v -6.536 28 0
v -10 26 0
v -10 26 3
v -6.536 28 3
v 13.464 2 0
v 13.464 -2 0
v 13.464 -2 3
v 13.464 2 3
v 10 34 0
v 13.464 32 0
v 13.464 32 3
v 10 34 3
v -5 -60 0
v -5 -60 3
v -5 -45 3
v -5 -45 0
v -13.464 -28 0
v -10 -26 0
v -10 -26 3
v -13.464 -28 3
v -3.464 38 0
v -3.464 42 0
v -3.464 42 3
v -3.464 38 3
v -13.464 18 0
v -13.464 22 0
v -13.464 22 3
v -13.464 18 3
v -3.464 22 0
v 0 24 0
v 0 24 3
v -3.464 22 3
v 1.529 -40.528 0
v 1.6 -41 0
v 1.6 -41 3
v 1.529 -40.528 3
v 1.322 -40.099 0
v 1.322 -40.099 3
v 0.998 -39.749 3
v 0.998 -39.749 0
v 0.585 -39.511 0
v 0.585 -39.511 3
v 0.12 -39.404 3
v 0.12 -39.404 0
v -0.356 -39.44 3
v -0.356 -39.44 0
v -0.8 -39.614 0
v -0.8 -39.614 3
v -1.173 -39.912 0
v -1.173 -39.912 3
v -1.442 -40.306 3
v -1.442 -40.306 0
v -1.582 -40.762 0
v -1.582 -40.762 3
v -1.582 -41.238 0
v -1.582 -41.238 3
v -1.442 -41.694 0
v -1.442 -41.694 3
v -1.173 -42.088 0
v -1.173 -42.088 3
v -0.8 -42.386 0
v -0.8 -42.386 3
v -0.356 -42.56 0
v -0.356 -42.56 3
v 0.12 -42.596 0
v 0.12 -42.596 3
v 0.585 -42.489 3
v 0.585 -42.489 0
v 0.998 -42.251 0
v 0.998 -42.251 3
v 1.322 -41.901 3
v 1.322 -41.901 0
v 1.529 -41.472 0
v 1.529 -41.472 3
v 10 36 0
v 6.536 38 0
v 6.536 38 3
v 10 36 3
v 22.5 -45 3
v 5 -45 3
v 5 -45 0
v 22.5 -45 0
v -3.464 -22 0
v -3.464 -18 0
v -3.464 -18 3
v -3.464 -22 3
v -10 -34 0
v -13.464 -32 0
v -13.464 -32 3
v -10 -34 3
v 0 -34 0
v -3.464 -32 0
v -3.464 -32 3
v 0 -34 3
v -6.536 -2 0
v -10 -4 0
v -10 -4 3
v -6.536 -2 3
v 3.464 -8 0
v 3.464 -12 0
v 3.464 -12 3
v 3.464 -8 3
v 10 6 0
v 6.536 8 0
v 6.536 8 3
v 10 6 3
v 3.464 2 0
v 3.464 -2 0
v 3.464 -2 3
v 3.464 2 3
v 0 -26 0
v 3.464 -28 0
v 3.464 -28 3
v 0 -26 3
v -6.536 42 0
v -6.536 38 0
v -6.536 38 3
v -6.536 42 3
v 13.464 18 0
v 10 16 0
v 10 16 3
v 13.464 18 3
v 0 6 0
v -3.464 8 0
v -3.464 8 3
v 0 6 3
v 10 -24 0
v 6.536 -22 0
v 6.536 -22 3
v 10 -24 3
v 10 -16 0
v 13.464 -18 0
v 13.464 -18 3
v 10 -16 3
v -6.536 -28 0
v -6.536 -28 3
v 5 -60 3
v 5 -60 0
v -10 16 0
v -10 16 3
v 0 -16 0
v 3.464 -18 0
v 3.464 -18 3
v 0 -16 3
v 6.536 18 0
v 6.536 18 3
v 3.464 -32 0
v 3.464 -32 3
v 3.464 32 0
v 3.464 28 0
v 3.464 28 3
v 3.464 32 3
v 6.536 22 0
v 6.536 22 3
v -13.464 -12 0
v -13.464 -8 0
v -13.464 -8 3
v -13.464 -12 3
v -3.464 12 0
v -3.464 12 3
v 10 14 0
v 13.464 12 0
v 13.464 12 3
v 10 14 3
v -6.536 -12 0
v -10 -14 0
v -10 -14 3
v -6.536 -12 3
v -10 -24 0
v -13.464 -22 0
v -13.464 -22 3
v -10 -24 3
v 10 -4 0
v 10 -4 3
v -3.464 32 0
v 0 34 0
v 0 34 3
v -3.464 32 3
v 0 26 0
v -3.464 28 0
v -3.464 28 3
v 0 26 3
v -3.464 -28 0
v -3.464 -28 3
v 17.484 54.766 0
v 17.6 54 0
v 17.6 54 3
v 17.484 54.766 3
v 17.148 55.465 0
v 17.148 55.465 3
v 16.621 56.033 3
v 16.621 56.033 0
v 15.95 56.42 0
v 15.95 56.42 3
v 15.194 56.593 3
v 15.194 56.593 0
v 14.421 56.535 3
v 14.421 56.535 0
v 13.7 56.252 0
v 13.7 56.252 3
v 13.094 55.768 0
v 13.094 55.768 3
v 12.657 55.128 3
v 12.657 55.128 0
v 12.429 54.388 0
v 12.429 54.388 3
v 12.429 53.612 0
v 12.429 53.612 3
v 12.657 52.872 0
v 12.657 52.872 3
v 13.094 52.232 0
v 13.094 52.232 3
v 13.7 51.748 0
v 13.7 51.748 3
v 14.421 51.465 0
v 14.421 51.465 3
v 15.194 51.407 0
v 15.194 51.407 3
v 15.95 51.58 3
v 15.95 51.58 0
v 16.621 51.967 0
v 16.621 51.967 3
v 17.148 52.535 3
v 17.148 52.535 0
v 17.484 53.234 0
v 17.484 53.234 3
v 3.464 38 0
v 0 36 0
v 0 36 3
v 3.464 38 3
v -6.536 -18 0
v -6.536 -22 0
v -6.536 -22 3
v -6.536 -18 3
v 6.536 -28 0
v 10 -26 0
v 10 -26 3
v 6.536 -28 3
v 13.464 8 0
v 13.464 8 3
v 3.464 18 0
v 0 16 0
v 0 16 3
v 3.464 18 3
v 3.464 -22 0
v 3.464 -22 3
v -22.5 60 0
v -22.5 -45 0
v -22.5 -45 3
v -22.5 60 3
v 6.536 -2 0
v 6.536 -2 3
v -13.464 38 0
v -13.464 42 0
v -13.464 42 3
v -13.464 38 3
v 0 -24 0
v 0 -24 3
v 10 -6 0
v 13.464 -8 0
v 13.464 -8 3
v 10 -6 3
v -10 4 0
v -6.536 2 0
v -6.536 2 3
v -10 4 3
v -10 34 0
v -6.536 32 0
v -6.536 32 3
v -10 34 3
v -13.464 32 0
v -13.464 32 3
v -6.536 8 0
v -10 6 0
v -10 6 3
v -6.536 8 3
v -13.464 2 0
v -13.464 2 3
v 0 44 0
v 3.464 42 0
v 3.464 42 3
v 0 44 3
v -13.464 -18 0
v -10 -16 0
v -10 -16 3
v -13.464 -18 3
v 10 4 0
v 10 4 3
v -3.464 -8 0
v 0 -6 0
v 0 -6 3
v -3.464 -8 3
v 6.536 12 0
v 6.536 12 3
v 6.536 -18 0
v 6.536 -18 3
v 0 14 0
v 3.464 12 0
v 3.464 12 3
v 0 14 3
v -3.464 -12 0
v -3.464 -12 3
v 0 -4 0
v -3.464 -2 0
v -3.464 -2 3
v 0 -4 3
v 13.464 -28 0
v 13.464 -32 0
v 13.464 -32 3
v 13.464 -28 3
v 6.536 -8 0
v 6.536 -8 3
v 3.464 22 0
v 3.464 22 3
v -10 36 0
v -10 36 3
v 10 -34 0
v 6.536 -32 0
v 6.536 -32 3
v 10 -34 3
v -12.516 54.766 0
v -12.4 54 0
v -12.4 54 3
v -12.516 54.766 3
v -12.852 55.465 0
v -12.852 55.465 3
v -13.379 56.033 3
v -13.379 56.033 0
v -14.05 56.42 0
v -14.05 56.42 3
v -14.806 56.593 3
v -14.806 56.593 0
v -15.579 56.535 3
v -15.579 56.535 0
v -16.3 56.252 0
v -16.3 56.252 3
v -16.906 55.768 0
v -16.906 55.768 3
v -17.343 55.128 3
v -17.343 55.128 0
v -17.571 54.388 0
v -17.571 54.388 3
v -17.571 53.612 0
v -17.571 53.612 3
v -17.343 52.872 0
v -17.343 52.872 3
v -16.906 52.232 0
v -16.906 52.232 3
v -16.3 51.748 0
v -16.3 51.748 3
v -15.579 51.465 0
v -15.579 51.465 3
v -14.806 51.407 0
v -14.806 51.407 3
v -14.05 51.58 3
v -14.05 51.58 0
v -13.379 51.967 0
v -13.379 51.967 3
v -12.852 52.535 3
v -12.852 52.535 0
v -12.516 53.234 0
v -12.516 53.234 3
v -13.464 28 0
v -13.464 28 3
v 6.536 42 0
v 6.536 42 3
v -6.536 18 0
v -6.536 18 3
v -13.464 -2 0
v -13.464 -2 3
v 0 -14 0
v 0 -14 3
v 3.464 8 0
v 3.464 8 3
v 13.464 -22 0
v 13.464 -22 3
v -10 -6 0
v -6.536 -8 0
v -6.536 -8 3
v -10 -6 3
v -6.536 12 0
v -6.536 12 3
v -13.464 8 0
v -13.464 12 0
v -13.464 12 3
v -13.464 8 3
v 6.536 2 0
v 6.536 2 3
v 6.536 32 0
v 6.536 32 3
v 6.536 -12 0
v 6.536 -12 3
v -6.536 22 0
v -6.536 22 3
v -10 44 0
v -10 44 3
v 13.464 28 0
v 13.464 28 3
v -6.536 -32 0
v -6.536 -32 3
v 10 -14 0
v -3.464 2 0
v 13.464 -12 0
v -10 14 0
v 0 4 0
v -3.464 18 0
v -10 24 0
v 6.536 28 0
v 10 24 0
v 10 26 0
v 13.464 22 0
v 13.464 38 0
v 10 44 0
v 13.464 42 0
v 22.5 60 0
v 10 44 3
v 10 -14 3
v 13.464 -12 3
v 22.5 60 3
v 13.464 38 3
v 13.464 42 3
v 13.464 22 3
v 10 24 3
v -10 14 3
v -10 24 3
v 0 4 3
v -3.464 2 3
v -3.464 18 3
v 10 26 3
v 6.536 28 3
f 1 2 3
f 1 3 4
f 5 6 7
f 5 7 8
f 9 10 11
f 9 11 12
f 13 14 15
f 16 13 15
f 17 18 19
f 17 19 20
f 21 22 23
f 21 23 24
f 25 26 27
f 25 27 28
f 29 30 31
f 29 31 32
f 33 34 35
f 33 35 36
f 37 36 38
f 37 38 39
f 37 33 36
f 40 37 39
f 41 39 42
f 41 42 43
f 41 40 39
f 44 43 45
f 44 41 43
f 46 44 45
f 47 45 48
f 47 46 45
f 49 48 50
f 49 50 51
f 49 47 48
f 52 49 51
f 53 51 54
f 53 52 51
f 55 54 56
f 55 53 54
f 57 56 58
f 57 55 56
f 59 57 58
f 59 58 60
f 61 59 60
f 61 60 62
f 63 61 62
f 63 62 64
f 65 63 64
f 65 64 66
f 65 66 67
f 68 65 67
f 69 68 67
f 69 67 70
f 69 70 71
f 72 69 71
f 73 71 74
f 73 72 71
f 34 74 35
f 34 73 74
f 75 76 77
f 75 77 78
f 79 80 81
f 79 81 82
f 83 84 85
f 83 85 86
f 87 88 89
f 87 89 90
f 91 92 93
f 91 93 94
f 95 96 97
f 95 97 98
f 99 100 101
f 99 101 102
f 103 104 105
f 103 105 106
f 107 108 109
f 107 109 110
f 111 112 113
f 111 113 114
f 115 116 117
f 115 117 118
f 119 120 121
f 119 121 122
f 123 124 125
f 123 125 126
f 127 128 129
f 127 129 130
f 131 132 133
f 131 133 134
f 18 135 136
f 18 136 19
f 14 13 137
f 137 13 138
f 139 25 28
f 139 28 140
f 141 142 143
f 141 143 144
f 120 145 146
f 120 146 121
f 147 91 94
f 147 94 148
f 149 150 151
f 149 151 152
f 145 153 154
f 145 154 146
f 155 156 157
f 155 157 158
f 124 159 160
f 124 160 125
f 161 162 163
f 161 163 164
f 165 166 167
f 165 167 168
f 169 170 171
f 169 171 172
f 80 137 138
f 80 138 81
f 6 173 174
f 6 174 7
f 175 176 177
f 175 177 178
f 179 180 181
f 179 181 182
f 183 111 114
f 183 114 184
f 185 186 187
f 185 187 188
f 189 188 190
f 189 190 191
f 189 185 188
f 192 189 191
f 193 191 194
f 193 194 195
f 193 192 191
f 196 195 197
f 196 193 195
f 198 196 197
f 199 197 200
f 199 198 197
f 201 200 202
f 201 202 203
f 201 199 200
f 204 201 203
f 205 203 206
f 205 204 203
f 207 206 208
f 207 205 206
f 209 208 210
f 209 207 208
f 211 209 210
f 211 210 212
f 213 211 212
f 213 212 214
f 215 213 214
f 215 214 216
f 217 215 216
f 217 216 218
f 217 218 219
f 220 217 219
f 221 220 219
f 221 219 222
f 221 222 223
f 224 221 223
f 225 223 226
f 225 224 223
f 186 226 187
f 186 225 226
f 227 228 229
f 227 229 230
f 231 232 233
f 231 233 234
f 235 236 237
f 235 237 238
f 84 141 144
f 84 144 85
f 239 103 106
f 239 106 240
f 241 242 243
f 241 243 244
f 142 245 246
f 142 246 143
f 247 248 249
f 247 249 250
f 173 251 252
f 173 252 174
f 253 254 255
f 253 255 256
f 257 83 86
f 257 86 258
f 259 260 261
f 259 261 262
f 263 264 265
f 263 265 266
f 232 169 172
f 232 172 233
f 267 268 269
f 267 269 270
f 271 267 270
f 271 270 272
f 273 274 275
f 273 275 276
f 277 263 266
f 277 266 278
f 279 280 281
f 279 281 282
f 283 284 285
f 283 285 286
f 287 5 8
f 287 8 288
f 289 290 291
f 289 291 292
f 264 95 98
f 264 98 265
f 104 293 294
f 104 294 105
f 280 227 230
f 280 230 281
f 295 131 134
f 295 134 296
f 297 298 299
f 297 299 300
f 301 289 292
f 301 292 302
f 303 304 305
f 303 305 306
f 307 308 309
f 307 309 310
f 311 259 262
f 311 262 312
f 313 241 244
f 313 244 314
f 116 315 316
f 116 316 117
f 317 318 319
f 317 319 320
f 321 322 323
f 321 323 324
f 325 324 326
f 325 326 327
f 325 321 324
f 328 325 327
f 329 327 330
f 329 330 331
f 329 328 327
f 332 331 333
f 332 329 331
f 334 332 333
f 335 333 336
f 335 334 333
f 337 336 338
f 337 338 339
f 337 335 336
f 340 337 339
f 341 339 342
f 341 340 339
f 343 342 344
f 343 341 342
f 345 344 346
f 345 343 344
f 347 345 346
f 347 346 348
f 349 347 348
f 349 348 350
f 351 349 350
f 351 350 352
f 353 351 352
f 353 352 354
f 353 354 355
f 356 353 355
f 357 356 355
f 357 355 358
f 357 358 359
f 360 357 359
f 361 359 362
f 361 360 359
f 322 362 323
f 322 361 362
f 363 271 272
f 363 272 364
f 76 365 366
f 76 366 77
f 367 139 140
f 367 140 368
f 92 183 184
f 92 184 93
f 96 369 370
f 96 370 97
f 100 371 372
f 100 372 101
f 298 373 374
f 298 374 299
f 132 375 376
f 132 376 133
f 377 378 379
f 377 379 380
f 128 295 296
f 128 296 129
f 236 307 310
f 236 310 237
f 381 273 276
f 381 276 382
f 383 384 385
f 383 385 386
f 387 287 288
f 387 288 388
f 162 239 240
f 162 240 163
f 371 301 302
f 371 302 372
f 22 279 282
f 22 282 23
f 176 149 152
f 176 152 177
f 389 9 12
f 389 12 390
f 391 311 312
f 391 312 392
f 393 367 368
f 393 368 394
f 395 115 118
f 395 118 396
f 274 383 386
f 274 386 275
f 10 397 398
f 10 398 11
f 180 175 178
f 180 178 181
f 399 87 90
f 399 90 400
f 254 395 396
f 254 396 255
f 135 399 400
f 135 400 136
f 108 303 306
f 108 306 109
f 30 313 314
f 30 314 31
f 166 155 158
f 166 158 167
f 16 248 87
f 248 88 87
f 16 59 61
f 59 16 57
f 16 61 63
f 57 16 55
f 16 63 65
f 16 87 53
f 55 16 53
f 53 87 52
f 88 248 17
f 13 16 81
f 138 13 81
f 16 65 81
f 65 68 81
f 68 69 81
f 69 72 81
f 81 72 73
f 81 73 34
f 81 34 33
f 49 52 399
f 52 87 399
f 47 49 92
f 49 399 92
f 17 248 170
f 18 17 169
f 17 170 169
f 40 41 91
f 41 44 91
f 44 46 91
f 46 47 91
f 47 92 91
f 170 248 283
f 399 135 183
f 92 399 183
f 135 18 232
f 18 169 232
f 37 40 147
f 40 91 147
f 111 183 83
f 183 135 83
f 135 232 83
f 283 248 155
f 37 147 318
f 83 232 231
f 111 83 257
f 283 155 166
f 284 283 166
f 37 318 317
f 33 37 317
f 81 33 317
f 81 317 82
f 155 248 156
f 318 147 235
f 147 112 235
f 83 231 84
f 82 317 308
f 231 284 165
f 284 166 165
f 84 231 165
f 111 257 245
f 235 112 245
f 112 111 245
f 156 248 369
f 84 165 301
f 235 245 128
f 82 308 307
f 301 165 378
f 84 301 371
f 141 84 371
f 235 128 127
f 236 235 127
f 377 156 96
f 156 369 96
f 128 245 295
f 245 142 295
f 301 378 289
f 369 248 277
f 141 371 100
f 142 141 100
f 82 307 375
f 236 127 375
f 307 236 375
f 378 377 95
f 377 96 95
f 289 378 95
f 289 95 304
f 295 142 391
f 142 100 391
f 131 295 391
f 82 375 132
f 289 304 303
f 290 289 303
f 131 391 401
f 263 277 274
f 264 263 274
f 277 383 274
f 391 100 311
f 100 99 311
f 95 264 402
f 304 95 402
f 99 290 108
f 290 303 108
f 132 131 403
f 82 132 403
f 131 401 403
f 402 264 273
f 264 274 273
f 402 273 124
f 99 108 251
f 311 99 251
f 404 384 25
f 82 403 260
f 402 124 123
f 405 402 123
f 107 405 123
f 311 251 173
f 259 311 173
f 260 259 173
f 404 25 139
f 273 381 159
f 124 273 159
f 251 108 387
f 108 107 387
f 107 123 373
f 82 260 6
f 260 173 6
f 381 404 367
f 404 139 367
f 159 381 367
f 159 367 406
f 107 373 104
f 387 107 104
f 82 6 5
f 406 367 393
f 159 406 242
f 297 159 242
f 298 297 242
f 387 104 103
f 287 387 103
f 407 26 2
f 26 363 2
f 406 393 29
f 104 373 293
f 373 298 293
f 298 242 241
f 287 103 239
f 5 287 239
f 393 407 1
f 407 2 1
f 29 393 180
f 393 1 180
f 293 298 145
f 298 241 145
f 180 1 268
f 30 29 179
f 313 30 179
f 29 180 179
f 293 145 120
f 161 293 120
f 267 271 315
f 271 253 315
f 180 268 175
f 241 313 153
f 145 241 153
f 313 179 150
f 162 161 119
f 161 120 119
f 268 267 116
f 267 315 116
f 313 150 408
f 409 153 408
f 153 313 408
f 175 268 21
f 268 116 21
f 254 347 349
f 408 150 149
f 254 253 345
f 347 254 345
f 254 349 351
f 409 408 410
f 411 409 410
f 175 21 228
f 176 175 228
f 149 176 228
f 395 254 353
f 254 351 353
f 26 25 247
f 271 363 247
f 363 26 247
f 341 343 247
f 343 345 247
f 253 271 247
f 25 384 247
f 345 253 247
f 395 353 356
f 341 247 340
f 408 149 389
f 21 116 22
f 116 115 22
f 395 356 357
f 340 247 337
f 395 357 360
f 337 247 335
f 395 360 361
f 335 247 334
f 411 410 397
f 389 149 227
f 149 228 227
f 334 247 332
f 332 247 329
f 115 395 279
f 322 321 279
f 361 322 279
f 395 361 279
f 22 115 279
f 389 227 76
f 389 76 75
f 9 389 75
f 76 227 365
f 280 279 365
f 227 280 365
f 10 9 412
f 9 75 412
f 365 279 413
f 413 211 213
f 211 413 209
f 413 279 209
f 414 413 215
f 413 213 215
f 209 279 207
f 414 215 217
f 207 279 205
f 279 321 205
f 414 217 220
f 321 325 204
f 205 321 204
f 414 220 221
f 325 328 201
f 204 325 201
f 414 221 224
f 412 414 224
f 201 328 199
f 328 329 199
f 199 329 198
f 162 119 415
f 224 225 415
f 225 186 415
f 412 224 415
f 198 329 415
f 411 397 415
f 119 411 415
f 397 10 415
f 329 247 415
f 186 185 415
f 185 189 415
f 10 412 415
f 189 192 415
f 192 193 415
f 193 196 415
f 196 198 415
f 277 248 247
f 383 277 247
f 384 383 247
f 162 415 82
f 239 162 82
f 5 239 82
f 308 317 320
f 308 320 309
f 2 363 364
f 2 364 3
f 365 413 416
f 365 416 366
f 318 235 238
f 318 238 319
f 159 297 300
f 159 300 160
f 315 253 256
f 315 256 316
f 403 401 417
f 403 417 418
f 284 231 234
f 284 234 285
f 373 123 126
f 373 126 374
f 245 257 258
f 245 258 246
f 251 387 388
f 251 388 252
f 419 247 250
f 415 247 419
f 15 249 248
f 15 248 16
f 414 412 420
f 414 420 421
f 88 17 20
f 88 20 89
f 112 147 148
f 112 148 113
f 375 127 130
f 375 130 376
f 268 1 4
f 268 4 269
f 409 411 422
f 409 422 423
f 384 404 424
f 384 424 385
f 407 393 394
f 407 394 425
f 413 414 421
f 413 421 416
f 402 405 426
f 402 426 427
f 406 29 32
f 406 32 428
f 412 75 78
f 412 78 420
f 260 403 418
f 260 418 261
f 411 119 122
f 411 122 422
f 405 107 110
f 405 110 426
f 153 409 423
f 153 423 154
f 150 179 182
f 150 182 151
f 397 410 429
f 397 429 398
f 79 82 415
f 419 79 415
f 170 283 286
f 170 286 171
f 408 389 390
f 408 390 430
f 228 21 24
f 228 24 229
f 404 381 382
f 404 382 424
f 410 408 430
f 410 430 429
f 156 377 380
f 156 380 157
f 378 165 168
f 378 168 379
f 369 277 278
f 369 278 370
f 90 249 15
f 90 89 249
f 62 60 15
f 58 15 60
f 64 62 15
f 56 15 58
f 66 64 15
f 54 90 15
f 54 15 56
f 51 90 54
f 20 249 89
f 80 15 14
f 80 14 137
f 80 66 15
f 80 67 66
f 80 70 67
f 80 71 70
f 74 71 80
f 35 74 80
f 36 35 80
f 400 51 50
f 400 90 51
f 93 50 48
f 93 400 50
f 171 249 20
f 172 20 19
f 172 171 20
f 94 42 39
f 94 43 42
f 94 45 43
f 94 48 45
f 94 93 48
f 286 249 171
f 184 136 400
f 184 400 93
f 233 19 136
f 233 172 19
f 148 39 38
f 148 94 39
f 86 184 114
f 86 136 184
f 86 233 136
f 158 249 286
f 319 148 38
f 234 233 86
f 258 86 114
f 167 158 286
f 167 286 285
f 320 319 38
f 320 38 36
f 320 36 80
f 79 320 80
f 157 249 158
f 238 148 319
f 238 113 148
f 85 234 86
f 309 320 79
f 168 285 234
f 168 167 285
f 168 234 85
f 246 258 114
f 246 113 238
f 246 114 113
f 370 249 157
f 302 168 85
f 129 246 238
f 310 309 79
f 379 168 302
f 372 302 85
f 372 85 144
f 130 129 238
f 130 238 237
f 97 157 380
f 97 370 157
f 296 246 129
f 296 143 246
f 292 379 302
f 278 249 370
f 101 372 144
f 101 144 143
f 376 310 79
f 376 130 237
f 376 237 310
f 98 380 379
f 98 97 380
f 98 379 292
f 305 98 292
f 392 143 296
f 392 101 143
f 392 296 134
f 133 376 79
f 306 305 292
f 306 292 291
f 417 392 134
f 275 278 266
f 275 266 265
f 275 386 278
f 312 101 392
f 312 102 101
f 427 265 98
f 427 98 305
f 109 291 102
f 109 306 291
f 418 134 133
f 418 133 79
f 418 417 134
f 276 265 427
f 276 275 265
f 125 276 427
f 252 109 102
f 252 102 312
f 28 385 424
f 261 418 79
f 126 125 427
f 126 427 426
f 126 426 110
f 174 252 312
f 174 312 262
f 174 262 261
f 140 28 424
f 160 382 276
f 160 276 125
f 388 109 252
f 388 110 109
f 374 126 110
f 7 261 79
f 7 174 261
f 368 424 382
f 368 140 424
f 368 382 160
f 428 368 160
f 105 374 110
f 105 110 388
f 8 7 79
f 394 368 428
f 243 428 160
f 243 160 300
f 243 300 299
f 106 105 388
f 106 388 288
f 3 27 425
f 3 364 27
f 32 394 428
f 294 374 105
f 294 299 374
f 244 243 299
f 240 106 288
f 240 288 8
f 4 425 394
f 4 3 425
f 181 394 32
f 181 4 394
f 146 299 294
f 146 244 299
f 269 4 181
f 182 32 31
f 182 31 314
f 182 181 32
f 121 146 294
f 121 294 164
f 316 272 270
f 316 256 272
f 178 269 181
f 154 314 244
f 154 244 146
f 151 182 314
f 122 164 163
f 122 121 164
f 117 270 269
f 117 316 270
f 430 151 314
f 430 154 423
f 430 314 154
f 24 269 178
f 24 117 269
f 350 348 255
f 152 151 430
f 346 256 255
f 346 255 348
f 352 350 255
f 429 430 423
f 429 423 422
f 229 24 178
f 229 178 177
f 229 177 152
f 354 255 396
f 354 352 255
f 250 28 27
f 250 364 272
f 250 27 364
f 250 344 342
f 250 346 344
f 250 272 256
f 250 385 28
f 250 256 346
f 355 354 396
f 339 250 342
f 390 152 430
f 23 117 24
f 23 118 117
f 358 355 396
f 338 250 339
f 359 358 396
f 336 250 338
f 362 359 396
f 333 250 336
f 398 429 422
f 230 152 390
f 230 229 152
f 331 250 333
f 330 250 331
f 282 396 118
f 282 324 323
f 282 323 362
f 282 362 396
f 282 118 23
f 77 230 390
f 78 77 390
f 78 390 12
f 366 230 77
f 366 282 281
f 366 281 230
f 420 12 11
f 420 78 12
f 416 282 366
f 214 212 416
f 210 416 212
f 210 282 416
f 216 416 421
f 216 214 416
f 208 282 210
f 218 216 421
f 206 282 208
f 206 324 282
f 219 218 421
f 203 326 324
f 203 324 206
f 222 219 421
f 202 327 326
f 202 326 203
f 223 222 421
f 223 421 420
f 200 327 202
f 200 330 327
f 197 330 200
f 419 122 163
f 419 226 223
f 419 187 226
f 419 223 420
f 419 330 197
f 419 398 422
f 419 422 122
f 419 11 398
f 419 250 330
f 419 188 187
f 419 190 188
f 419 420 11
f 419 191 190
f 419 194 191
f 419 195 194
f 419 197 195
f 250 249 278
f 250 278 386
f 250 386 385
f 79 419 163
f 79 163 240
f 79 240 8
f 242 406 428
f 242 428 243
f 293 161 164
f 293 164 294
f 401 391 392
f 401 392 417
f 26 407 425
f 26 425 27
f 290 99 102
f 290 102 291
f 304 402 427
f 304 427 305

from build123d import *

# Parameters (mm, degrees)
SKETCH_2_W          = 45
SKETCH_2_H          = 120
SKETCH_2_R          = 2.6
SKETCH_2_R_2        = 1.6
EXTRUDE_1_DEPTH     = 3
SKETCH_3_W          = 17.5
SKETCH_3_H          = 15
CUT_EXTRUDE_1_DEPTH = 3


with BuildPart() as part:
    # 草图2 → 凸台-拉伸1 (new body)
    with BuildSketch(Plane.XY):
        Rectangle(SKETCH_2_W, SKETCH_2_H)
        with Locations((-15, 54)):
            Circle(SKETCH_2_R, mode=Mode.SUBTRACT)
        with Locations((15, 54)):
            Circle(SKETCH_2_R, mode=Mode.SUBTRACT)
        with Locations((0, -41)):
            Circle(SKETCH_2_R_2, mode=Mode.SUBTRACT)
        Polygon((10, 4), (6.535898385, 2), (6.535898385, -2), (10, -4), (13.464101615, -2), (13.464101615, 2), align=None, mode=Mode.SUBTRACT)
        Polygon((0, 4), (-3.464101615, 2), (-3.464101615, -2), (0, -4), (3.464101615, -2), (3.464101615, 2), align=None, mode=Mode.SUBTRACT)
        Polygon((-10, 4), (-13.464101615, 2), (-13.464101615, -2), (-10, -4), (-6.535898385, -2), (-6.535898385, 2), align=None, mode=Mode.SUBTRACT)
        Polygon((10, 14), (6.535898385, 12), (6.535898385, 8), (10, 6), (13.464101615, 8), (13.464101615, 12), align=None, mode=Mode.SUBTRACT)
        Polygon((0, 14), (-3.464101615, 12), (-3.464101615, 8), (0, 6), (3.464101615, 8), (3.464101615, 12), align=None, mode=Mode.SUBTRACT)
        Polygon((-10, 14), (-13.464101615, 12), (-13.464101615, 8), (-10, 6), (-6.535898385, 8), (-6.535898385, 12), align=None, mode=Mode.SUBTRACT)
        Polygon((10, 24), (6.535898385, 22), (6.535898385, 18), (10, 16), (13.464101615, 18), (13.464101615, 22), align=None, mode=Mode.SUBTRACT)
        Polygon((0, 24), (-3.464101615, 22), (-3.464101615, 18), (0, 16), (3.464101615, 18), (3.464101615, 22), align=None, mode=Mode.SUBTRACT)
        Polygon((-10, 24), (-13.464101615, 22), (-13.464101615, 18), (-10, 16), (-6.535898385, 18), (-6.535898385, 22), align=None, mode=Mode.SUBTRACT)
        Polygon((10, 34), (6.535898385, 32), (6.535898385, 28), (10, 26), (13.464101615, 28), (13.464101615, 32), align=None, mode=Mode.SUBTRACT)
        Polygon((0, 34), (-3.464101615, 32), (-3.464101615, 28), (0, 26), (3.464101615, 28), (3.464101615, 32), align=None, mode=Mode.SUBTRACT)
        Polygon((-10, 34), (-13.464101615, 32), (-13.464101615, 28), (-10, 26), (-6.535898385, 28), (-6.535898385, 32), align=None, mode=Mode.SUBTRACT)
        Polygon((10, 44), (6.535898385, 42), (6.535898385, 38), (10, 36), (13.464101615, 38), (13.464101615, 42), align=None, mode=Mode.SUBTRACT)
        Polygon((0, 44), (-3.464101615, 42), (-3.464101615, 38), (0, 36), (3.464101615, 38), (3.464101615, 42), align=None, mode=Mode.SUBTRACT)
        Polygon((-10, 44), (-13.464101615, 42), (-13.464101615, 38), (-10, 36), (-6.535898385, 38), (-6.535898385, 42), align=None, mode=Mode.SUBTRACT)
        Polygon((-10, -6), (-13.464101615, -8), (-13.464101615, -12), (-10, -14), (-6.535898385, -12), (-6.535898385, -8), align=None, mode=Mode.SUBTRACT)
        Polygon((0, -6), (-3.464101615, -8), (-3.464101615, -12), (0, -14), (3.464101615, -12), (3.464101615, -8), align=None, mode=Mode.SUBTRACT)
        Polygon((10, -6), (6.535898385, -8), (6.535898385, -12), (10, -14), (13.464101615, -12), (13.464101615, -8), align=None, mode=Mode.SUBTRACT)
        Polygon((-10, -16), (-13.464101615, -18), (-13.464101615, -22), (-10, -24), (-6.535898385, -22), (-6.535898385, -18), align=None, mode=Mode.SUBTRACT)
        Polygon((0, -16), (-3.464101615, -18), (-3.464101615, -22), (0, -24), (3.464101615, -22), (3.464101615, -18), align=None, mode=Mode.SUBTRACT)
        Polygon((10, -16), (6.535898385, -18), (6.535898385, -22), (10, -24), (13.464101615, -22), (13.464101615, -18), align=None, mode=Mode.SUBTRACT)
        Polygon((-10, -26), (-13.464101615, -28), (-13.464101615, -32), (-10, -34), (-6.535898385, -32), (-6.535898385, -28), align=None, mode=Mode.SUBTRACT)
        Polygon((0, -26), (-3.464101615, -28), (-3.464101615, -32), (0, -34), (3.464101615, -32), (3.464101615, -28), align=None, mode=Mode.SUBTRACT)
        Polygon((10, -26), (6.535898385, -28), (6.535898385, -32), (10, -34), (13.464101615, -32), (13.464101615, -28), align=None, mode=Mode.SUBTRACT)
    extrude(amount=EXTRUDE_1_DEPTH)

    # 草图3 → 切除-拉伸1 (cut)
    with BuildSketch(Plane.XY.offset(3)):
        with Locations((-13.75, -52.5)):
            Rectangle(SKETCH_3_W, SKETCH_3_H)
        with Locations((13.75, -52.5)):
            Rectangle(SKETCH_3_W, SKETCH_3_H)
    extrude(amount=-CUT_EXTRUDE_1_DEPTH, mode=Mode.SUBTRACT)


solid = part.part
